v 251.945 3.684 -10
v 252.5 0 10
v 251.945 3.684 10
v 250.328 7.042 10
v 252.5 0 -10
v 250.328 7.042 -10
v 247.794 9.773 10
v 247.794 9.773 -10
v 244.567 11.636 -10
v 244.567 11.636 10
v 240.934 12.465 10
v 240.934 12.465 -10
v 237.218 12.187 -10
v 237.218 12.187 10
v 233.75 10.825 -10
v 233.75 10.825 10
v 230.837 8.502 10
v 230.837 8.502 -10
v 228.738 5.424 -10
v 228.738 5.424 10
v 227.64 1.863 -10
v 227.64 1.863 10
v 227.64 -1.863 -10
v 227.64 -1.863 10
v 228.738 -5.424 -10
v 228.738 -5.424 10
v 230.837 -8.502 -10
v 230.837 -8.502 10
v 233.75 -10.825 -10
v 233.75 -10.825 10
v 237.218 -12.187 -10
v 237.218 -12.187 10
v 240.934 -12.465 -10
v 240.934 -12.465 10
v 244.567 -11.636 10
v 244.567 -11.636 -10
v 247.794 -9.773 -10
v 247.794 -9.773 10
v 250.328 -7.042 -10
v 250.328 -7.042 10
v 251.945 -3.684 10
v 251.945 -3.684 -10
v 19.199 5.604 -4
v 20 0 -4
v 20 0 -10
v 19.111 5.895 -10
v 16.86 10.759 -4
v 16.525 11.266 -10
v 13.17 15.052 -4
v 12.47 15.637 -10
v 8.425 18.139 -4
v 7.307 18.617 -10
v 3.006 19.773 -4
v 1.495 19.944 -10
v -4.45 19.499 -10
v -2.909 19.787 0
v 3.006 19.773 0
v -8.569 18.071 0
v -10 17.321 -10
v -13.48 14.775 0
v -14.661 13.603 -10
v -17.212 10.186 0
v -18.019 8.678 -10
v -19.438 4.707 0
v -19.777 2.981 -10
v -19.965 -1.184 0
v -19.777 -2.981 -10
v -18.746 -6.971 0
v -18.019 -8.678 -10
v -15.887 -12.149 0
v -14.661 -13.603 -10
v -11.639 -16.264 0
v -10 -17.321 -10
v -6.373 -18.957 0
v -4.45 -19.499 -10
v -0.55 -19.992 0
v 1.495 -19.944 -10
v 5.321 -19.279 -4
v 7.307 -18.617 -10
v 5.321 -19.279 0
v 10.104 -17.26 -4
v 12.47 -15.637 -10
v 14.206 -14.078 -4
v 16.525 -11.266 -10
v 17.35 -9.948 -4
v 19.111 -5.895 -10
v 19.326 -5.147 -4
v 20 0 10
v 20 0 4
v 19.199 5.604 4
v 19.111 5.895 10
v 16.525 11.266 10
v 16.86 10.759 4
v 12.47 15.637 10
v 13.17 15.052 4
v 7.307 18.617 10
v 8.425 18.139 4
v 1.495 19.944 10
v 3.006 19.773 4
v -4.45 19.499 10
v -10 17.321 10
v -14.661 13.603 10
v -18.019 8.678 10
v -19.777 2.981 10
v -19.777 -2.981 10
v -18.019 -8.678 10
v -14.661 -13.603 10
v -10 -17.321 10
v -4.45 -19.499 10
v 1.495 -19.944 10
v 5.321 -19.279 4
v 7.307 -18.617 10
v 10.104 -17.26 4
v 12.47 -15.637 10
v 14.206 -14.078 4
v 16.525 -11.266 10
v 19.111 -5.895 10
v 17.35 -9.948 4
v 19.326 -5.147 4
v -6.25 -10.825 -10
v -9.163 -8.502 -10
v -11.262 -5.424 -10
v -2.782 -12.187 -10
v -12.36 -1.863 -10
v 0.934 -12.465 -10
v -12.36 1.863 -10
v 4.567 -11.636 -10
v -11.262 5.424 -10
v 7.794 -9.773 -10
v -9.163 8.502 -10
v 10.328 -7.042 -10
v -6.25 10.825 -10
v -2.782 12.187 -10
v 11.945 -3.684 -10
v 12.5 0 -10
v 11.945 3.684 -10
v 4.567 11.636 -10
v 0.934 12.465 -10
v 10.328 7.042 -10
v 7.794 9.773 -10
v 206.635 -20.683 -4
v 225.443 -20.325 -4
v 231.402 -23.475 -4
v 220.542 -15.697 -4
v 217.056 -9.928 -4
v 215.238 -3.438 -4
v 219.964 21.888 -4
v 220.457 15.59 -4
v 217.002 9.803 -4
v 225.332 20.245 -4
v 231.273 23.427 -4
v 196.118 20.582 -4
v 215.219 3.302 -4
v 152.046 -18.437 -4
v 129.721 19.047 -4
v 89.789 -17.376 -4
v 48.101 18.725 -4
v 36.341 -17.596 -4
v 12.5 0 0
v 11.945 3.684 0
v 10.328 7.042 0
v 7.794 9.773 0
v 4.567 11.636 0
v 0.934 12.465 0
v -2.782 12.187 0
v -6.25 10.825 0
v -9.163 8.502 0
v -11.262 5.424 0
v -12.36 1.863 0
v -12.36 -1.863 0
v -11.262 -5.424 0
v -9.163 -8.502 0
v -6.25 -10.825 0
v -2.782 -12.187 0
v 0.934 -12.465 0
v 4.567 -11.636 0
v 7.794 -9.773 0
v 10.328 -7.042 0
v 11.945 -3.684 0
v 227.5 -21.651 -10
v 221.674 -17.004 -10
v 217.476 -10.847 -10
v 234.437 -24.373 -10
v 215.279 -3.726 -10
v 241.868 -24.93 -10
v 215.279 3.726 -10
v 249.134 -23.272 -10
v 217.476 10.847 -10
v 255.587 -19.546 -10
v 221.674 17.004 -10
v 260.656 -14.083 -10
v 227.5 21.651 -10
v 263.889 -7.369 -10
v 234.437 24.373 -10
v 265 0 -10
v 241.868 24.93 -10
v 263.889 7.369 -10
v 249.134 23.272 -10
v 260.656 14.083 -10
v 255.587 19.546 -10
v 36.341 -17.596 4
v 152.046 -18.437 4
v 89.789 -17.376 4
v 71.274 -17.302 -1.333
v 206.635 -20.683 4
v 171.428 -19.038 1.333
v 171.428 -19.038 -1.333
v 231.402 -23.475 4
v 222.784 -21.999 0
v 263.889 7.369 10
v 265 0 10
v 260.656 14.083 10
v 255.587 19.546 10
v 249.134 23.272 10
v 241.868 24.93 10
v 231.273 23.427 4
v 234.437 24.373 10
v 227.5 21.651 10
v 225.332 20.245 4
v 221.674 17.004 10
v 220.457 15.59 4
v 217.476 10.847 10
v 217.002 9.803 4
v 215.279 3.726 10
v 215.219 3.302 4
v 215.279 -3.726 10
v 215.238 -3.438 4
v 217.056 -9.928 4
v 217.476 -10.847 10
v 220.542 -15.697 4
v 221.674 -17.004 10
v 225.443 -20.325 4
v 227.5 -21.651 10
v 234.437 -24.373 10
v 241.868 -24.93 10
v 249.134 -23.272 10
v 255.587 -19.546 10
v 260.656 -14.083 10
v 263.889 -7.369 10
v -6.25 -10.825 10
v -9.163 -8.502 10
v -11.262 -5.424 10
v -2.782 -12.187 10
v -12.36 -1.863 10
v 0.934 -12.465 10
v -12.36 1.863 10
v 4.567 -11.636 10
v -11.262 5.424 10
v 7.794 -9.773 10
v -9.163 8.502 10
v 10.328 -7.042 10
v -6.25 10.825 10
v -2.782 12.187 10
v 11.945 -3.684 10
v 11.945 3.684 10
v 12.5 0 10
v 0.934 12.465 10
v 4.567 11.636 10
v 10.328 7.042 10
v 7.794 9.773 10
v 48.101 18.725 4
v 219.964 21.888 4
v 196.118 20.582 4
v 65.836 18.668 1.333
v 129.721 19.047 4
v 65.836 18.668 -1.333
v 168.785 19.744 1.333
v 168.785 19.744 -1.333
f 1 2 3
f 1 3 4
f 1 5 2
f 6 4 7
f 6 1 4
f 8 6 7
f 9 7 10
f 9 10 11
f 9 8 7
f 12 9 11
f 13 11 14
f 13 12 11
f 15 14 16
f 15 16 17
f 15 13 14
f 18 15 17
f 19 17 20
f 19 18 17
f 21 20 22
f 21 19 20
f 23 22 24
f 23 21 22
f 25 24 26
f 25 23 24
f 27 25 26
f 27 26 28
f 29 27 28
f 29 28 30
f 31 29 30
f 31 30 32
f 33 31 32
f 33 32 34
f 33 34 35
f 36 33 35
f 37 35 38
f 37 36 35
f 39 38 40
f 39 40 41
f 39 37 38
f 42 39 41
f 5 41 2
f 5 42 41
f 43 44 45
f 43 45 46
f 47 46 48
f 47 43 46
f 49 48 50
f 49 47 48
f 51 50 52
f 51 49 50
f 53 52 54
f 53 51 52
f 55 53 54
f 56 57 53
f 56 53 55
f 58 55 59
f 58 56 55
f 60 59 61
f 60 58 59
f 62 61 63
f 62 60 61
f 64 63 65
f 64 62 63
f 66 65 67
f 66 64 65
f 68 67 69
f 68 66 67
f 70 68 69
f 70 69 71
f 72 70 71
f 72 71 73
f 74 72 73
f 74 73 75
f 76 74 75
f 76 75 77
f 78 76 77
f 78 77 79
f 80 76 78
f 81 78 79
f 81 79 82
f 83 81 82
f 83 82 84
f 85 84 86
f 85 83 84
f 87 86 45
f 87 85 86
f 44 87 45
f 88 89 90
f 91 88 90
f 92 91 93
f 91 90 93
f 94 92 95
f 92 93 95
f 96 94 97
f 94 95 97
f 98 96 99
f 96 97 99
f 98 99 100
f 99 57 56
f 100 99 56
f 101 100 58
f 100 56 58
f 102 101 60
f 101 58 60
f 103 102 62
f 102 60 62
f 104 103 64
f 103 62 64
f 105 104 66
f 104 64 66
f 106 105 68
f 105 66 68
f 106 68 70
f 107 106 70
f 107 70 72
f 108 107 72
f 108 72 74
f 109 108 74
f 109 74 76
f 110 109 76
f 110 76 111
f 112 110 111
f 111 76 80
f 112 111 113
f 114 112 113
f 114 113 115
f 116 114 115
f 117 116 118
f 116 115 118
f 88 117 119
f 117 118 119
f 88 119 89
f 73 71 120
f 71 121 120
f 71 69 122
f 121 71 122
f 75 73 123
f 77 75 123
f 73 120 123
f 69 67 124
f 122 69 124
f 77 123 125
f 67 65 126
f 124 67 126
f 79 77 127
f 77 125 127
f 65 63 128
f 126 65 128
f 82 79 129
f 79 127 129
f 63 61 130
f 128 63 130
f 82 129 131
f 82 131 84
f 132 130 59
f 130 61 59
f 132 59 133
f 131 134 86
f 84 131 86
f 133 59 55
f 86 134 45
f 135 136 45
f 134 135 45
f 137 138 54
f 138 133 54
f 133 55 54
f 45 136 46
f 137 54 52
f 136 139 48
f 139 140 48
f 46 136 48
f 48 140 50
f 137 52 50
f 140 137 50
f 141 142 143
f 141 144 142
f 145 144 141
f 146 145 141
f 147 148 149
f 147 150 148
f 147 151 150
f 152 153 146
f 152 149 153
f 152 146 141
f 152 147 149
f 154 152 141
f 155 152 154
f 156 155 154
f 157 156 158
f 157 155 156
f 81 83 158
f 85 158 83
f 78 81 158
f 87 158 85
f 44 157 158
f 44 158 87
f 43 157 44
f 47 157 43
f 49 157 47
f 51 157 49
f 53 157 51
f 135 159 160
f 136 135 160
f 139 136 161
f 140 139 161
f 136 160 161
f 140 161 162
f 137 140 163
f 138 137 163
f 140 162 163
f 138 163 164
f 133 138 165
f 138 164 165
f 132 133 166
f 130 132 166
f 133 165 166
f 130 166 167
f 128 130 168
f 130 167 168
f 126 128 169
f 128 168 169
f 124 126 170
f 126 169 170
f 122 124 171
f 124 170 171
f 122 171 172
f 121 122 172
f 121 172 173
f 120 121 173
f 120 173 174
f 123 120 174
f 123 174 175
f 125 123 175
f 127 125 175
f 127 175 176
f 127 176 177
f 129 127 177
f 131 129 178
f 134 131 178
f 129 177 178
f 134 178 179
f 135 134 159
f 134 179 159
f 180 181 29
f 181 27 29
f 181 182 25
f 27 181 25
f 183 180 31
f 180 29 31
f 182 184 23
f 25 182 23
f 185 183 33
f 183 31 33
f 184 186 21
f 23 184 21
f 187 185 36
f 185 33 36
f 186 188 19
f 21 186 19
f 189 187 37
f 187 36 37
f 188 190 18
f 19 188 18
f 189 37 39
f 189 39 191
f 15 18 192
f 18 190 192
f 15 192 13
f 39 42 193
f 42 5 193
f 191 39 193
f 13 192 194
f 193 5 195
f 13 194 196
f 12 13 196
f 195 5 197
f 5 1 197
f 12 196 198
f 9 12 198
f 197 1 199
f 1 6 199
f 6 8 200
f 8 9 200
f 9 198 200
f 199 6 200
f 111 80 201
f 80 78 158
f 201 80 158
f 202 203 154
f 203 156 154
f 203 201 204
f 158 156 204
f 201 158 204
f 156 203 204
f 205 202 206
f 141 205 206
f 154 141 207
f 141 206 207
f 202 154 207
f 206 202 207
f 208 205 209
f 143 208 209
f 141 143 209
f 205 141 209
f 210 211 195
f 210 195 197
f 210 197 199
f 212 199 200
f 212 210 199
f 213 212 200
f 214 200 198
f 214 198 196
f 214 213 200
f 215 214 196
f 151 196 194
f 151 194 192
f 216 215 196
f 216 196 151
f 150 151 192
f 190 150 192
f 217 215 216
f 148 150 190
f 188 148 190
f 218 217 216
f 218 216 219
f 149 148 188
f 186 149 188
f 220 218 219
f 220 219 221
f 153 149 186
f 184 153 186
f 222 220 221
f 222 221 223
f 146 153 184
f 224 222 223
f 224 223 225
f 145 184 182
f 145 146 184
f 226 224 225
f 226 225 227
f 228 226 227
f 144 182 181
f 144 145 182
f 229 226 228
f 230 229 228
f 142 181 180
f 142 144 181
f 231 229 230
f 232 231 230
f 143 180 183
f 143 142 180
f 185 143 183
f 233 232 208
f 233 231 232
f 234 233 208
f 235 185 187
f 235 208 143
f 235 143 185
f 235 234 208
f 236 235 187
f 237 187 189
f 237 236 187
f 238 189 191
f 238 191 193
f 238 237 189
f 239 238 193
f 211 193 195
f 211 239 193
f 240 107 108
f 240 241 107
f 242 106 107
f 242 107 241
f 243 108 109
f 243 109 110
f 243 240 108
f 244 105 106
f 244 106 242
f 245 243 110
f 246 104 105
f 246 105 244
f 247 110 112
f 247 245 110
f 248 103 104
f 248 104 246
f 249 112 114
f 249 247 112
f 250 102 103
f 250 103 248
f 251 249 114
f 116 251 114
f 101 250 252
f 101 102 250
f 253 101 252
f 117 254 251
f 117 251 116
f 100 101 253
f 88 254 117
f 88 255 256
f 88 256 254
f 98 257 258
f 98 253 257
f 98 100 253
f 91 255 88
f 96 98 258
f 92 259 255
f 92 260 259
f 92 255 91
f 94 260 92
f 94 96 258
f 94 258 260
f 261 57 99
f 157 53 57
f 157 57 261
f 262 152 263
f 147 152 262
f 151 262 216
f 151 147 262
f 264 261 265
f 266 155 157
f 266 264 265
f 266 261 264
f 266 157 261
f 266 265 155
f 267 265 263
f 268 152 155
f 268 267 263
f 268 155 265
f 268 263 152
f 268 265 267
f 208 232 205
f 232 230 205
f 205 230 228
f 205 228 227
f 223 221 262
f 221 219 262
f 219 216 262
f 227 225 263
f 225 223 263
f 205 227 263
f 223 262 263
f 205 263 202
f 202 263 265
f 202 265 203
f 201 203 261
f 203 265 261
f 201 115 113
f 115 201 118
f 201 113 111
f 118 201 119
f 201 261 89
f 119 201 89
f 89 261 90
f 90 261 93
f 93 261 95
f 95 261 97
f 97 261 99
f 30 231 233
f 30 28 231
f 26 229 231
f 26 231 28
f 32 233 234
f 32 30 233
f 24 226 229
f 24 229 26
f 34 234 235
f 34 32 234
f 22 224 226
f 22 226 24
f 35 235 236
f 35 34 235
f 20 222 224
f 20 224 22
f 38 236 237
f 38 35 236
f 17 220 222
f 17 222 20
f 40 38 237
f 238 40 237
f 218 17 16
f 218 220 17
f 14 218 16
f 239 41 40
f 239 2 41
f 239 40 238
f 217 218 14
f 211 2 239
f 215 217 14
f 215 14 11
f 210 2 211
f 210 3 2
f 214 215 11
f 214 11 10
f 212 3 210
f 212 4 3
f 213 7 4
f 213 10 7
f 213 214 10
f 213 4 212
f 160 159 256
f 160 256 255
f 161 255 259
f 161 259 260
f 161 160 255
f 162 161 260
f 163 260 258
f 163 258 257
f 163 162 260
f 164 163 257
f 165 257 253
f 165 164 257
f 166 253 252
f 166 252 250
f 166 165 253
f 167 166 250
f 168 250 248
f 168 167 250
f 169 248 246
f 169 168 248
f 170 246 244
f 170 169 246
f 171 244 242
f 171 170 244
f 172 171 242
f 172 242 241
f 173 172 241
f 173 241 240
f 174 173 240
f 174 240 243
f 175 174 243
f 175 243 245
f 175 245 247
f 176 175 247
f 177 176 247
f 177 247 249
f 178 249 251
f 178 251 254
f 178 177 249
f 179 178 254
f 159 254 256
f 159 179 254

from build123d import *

# Parameters (mm, degrees)
BOSS_EXTRUDE1_START = -4
BOSS_EXTRUDE1_DEPTH = 8
SKETCH4_R           = 20
SKETCH4_R_2         = 12.5
SKETCH4_R_3         = 25
BOSS_EXTRUDE5_DEPTH = 10


# Read off the part's stored shape, not the designer's step: Boss-Extrude1
with BuildPart() as part:
    # Boss-Extrude1 outline → Boss-Extrude1 (new body)
    with BuildSketch(Plane.XY.offset(BOSS_EXTRUDE1_START)):
        with BuildLine():
            add(Edge.make_bspline(
                [(3.005567425, 19.772874461), (18.916222227, 17.720110762), (215.876421889, 18.298562521), (231.273379323, 23.427464471)],
                knots=[0.02790249, 0.02790249, 0.02790249, 0.02790249, 0.919000917, 0.919000917, 0.919000917, 0.919000917], degree=3))
            ThreePointArc((3.005567425, 19.772874461), (19.964927421, 1.183922747), (5.321353729, -19.279086973))
            add(Edge.make_bspline(
                [(5.321353729, -19.279086973), (29.380163277, -15.107768003), (216.311047881, -18.024838758), (231.401749268, -23.474881988)],
                knots=[0.059243279, 0.059243279, 0.059243279, 0.059243279, 0.920155583, 0.920155583, 0.920155583, 0.920155583], degree=3))
            ThreePointArc((231.401749268, -23.474881988), (215.000093636, -0.068423797), (231.273379323, 23.427464471))
        make_face()
    extrude(amount=BOSS_EXTRUDE1_DEPTH)

    # Sketch4 → Boss-Extrude5 (add, symmetric)
    # profile 1 of 2: a face of its own
    with BuildSketch(Plane.XY):
        Circle(SKETCH4_R)
        Circle(SKETCH4_R_2, mode=Mode.SUBTRACT)
    # profile 2 of 2: a face of its own
    with BuildSketch(Plane.XY):
        with Locations((240, 0)):
            Circle(SKETCH4_R_3)
        with Locations((240, 0)):
            Circle(SKETCH4_R_2, mode=Mode.SUBTRACT)
    extrude(amount=BOSS_EXTRUDE5_DEPTH, both=True)


solid = part.part
